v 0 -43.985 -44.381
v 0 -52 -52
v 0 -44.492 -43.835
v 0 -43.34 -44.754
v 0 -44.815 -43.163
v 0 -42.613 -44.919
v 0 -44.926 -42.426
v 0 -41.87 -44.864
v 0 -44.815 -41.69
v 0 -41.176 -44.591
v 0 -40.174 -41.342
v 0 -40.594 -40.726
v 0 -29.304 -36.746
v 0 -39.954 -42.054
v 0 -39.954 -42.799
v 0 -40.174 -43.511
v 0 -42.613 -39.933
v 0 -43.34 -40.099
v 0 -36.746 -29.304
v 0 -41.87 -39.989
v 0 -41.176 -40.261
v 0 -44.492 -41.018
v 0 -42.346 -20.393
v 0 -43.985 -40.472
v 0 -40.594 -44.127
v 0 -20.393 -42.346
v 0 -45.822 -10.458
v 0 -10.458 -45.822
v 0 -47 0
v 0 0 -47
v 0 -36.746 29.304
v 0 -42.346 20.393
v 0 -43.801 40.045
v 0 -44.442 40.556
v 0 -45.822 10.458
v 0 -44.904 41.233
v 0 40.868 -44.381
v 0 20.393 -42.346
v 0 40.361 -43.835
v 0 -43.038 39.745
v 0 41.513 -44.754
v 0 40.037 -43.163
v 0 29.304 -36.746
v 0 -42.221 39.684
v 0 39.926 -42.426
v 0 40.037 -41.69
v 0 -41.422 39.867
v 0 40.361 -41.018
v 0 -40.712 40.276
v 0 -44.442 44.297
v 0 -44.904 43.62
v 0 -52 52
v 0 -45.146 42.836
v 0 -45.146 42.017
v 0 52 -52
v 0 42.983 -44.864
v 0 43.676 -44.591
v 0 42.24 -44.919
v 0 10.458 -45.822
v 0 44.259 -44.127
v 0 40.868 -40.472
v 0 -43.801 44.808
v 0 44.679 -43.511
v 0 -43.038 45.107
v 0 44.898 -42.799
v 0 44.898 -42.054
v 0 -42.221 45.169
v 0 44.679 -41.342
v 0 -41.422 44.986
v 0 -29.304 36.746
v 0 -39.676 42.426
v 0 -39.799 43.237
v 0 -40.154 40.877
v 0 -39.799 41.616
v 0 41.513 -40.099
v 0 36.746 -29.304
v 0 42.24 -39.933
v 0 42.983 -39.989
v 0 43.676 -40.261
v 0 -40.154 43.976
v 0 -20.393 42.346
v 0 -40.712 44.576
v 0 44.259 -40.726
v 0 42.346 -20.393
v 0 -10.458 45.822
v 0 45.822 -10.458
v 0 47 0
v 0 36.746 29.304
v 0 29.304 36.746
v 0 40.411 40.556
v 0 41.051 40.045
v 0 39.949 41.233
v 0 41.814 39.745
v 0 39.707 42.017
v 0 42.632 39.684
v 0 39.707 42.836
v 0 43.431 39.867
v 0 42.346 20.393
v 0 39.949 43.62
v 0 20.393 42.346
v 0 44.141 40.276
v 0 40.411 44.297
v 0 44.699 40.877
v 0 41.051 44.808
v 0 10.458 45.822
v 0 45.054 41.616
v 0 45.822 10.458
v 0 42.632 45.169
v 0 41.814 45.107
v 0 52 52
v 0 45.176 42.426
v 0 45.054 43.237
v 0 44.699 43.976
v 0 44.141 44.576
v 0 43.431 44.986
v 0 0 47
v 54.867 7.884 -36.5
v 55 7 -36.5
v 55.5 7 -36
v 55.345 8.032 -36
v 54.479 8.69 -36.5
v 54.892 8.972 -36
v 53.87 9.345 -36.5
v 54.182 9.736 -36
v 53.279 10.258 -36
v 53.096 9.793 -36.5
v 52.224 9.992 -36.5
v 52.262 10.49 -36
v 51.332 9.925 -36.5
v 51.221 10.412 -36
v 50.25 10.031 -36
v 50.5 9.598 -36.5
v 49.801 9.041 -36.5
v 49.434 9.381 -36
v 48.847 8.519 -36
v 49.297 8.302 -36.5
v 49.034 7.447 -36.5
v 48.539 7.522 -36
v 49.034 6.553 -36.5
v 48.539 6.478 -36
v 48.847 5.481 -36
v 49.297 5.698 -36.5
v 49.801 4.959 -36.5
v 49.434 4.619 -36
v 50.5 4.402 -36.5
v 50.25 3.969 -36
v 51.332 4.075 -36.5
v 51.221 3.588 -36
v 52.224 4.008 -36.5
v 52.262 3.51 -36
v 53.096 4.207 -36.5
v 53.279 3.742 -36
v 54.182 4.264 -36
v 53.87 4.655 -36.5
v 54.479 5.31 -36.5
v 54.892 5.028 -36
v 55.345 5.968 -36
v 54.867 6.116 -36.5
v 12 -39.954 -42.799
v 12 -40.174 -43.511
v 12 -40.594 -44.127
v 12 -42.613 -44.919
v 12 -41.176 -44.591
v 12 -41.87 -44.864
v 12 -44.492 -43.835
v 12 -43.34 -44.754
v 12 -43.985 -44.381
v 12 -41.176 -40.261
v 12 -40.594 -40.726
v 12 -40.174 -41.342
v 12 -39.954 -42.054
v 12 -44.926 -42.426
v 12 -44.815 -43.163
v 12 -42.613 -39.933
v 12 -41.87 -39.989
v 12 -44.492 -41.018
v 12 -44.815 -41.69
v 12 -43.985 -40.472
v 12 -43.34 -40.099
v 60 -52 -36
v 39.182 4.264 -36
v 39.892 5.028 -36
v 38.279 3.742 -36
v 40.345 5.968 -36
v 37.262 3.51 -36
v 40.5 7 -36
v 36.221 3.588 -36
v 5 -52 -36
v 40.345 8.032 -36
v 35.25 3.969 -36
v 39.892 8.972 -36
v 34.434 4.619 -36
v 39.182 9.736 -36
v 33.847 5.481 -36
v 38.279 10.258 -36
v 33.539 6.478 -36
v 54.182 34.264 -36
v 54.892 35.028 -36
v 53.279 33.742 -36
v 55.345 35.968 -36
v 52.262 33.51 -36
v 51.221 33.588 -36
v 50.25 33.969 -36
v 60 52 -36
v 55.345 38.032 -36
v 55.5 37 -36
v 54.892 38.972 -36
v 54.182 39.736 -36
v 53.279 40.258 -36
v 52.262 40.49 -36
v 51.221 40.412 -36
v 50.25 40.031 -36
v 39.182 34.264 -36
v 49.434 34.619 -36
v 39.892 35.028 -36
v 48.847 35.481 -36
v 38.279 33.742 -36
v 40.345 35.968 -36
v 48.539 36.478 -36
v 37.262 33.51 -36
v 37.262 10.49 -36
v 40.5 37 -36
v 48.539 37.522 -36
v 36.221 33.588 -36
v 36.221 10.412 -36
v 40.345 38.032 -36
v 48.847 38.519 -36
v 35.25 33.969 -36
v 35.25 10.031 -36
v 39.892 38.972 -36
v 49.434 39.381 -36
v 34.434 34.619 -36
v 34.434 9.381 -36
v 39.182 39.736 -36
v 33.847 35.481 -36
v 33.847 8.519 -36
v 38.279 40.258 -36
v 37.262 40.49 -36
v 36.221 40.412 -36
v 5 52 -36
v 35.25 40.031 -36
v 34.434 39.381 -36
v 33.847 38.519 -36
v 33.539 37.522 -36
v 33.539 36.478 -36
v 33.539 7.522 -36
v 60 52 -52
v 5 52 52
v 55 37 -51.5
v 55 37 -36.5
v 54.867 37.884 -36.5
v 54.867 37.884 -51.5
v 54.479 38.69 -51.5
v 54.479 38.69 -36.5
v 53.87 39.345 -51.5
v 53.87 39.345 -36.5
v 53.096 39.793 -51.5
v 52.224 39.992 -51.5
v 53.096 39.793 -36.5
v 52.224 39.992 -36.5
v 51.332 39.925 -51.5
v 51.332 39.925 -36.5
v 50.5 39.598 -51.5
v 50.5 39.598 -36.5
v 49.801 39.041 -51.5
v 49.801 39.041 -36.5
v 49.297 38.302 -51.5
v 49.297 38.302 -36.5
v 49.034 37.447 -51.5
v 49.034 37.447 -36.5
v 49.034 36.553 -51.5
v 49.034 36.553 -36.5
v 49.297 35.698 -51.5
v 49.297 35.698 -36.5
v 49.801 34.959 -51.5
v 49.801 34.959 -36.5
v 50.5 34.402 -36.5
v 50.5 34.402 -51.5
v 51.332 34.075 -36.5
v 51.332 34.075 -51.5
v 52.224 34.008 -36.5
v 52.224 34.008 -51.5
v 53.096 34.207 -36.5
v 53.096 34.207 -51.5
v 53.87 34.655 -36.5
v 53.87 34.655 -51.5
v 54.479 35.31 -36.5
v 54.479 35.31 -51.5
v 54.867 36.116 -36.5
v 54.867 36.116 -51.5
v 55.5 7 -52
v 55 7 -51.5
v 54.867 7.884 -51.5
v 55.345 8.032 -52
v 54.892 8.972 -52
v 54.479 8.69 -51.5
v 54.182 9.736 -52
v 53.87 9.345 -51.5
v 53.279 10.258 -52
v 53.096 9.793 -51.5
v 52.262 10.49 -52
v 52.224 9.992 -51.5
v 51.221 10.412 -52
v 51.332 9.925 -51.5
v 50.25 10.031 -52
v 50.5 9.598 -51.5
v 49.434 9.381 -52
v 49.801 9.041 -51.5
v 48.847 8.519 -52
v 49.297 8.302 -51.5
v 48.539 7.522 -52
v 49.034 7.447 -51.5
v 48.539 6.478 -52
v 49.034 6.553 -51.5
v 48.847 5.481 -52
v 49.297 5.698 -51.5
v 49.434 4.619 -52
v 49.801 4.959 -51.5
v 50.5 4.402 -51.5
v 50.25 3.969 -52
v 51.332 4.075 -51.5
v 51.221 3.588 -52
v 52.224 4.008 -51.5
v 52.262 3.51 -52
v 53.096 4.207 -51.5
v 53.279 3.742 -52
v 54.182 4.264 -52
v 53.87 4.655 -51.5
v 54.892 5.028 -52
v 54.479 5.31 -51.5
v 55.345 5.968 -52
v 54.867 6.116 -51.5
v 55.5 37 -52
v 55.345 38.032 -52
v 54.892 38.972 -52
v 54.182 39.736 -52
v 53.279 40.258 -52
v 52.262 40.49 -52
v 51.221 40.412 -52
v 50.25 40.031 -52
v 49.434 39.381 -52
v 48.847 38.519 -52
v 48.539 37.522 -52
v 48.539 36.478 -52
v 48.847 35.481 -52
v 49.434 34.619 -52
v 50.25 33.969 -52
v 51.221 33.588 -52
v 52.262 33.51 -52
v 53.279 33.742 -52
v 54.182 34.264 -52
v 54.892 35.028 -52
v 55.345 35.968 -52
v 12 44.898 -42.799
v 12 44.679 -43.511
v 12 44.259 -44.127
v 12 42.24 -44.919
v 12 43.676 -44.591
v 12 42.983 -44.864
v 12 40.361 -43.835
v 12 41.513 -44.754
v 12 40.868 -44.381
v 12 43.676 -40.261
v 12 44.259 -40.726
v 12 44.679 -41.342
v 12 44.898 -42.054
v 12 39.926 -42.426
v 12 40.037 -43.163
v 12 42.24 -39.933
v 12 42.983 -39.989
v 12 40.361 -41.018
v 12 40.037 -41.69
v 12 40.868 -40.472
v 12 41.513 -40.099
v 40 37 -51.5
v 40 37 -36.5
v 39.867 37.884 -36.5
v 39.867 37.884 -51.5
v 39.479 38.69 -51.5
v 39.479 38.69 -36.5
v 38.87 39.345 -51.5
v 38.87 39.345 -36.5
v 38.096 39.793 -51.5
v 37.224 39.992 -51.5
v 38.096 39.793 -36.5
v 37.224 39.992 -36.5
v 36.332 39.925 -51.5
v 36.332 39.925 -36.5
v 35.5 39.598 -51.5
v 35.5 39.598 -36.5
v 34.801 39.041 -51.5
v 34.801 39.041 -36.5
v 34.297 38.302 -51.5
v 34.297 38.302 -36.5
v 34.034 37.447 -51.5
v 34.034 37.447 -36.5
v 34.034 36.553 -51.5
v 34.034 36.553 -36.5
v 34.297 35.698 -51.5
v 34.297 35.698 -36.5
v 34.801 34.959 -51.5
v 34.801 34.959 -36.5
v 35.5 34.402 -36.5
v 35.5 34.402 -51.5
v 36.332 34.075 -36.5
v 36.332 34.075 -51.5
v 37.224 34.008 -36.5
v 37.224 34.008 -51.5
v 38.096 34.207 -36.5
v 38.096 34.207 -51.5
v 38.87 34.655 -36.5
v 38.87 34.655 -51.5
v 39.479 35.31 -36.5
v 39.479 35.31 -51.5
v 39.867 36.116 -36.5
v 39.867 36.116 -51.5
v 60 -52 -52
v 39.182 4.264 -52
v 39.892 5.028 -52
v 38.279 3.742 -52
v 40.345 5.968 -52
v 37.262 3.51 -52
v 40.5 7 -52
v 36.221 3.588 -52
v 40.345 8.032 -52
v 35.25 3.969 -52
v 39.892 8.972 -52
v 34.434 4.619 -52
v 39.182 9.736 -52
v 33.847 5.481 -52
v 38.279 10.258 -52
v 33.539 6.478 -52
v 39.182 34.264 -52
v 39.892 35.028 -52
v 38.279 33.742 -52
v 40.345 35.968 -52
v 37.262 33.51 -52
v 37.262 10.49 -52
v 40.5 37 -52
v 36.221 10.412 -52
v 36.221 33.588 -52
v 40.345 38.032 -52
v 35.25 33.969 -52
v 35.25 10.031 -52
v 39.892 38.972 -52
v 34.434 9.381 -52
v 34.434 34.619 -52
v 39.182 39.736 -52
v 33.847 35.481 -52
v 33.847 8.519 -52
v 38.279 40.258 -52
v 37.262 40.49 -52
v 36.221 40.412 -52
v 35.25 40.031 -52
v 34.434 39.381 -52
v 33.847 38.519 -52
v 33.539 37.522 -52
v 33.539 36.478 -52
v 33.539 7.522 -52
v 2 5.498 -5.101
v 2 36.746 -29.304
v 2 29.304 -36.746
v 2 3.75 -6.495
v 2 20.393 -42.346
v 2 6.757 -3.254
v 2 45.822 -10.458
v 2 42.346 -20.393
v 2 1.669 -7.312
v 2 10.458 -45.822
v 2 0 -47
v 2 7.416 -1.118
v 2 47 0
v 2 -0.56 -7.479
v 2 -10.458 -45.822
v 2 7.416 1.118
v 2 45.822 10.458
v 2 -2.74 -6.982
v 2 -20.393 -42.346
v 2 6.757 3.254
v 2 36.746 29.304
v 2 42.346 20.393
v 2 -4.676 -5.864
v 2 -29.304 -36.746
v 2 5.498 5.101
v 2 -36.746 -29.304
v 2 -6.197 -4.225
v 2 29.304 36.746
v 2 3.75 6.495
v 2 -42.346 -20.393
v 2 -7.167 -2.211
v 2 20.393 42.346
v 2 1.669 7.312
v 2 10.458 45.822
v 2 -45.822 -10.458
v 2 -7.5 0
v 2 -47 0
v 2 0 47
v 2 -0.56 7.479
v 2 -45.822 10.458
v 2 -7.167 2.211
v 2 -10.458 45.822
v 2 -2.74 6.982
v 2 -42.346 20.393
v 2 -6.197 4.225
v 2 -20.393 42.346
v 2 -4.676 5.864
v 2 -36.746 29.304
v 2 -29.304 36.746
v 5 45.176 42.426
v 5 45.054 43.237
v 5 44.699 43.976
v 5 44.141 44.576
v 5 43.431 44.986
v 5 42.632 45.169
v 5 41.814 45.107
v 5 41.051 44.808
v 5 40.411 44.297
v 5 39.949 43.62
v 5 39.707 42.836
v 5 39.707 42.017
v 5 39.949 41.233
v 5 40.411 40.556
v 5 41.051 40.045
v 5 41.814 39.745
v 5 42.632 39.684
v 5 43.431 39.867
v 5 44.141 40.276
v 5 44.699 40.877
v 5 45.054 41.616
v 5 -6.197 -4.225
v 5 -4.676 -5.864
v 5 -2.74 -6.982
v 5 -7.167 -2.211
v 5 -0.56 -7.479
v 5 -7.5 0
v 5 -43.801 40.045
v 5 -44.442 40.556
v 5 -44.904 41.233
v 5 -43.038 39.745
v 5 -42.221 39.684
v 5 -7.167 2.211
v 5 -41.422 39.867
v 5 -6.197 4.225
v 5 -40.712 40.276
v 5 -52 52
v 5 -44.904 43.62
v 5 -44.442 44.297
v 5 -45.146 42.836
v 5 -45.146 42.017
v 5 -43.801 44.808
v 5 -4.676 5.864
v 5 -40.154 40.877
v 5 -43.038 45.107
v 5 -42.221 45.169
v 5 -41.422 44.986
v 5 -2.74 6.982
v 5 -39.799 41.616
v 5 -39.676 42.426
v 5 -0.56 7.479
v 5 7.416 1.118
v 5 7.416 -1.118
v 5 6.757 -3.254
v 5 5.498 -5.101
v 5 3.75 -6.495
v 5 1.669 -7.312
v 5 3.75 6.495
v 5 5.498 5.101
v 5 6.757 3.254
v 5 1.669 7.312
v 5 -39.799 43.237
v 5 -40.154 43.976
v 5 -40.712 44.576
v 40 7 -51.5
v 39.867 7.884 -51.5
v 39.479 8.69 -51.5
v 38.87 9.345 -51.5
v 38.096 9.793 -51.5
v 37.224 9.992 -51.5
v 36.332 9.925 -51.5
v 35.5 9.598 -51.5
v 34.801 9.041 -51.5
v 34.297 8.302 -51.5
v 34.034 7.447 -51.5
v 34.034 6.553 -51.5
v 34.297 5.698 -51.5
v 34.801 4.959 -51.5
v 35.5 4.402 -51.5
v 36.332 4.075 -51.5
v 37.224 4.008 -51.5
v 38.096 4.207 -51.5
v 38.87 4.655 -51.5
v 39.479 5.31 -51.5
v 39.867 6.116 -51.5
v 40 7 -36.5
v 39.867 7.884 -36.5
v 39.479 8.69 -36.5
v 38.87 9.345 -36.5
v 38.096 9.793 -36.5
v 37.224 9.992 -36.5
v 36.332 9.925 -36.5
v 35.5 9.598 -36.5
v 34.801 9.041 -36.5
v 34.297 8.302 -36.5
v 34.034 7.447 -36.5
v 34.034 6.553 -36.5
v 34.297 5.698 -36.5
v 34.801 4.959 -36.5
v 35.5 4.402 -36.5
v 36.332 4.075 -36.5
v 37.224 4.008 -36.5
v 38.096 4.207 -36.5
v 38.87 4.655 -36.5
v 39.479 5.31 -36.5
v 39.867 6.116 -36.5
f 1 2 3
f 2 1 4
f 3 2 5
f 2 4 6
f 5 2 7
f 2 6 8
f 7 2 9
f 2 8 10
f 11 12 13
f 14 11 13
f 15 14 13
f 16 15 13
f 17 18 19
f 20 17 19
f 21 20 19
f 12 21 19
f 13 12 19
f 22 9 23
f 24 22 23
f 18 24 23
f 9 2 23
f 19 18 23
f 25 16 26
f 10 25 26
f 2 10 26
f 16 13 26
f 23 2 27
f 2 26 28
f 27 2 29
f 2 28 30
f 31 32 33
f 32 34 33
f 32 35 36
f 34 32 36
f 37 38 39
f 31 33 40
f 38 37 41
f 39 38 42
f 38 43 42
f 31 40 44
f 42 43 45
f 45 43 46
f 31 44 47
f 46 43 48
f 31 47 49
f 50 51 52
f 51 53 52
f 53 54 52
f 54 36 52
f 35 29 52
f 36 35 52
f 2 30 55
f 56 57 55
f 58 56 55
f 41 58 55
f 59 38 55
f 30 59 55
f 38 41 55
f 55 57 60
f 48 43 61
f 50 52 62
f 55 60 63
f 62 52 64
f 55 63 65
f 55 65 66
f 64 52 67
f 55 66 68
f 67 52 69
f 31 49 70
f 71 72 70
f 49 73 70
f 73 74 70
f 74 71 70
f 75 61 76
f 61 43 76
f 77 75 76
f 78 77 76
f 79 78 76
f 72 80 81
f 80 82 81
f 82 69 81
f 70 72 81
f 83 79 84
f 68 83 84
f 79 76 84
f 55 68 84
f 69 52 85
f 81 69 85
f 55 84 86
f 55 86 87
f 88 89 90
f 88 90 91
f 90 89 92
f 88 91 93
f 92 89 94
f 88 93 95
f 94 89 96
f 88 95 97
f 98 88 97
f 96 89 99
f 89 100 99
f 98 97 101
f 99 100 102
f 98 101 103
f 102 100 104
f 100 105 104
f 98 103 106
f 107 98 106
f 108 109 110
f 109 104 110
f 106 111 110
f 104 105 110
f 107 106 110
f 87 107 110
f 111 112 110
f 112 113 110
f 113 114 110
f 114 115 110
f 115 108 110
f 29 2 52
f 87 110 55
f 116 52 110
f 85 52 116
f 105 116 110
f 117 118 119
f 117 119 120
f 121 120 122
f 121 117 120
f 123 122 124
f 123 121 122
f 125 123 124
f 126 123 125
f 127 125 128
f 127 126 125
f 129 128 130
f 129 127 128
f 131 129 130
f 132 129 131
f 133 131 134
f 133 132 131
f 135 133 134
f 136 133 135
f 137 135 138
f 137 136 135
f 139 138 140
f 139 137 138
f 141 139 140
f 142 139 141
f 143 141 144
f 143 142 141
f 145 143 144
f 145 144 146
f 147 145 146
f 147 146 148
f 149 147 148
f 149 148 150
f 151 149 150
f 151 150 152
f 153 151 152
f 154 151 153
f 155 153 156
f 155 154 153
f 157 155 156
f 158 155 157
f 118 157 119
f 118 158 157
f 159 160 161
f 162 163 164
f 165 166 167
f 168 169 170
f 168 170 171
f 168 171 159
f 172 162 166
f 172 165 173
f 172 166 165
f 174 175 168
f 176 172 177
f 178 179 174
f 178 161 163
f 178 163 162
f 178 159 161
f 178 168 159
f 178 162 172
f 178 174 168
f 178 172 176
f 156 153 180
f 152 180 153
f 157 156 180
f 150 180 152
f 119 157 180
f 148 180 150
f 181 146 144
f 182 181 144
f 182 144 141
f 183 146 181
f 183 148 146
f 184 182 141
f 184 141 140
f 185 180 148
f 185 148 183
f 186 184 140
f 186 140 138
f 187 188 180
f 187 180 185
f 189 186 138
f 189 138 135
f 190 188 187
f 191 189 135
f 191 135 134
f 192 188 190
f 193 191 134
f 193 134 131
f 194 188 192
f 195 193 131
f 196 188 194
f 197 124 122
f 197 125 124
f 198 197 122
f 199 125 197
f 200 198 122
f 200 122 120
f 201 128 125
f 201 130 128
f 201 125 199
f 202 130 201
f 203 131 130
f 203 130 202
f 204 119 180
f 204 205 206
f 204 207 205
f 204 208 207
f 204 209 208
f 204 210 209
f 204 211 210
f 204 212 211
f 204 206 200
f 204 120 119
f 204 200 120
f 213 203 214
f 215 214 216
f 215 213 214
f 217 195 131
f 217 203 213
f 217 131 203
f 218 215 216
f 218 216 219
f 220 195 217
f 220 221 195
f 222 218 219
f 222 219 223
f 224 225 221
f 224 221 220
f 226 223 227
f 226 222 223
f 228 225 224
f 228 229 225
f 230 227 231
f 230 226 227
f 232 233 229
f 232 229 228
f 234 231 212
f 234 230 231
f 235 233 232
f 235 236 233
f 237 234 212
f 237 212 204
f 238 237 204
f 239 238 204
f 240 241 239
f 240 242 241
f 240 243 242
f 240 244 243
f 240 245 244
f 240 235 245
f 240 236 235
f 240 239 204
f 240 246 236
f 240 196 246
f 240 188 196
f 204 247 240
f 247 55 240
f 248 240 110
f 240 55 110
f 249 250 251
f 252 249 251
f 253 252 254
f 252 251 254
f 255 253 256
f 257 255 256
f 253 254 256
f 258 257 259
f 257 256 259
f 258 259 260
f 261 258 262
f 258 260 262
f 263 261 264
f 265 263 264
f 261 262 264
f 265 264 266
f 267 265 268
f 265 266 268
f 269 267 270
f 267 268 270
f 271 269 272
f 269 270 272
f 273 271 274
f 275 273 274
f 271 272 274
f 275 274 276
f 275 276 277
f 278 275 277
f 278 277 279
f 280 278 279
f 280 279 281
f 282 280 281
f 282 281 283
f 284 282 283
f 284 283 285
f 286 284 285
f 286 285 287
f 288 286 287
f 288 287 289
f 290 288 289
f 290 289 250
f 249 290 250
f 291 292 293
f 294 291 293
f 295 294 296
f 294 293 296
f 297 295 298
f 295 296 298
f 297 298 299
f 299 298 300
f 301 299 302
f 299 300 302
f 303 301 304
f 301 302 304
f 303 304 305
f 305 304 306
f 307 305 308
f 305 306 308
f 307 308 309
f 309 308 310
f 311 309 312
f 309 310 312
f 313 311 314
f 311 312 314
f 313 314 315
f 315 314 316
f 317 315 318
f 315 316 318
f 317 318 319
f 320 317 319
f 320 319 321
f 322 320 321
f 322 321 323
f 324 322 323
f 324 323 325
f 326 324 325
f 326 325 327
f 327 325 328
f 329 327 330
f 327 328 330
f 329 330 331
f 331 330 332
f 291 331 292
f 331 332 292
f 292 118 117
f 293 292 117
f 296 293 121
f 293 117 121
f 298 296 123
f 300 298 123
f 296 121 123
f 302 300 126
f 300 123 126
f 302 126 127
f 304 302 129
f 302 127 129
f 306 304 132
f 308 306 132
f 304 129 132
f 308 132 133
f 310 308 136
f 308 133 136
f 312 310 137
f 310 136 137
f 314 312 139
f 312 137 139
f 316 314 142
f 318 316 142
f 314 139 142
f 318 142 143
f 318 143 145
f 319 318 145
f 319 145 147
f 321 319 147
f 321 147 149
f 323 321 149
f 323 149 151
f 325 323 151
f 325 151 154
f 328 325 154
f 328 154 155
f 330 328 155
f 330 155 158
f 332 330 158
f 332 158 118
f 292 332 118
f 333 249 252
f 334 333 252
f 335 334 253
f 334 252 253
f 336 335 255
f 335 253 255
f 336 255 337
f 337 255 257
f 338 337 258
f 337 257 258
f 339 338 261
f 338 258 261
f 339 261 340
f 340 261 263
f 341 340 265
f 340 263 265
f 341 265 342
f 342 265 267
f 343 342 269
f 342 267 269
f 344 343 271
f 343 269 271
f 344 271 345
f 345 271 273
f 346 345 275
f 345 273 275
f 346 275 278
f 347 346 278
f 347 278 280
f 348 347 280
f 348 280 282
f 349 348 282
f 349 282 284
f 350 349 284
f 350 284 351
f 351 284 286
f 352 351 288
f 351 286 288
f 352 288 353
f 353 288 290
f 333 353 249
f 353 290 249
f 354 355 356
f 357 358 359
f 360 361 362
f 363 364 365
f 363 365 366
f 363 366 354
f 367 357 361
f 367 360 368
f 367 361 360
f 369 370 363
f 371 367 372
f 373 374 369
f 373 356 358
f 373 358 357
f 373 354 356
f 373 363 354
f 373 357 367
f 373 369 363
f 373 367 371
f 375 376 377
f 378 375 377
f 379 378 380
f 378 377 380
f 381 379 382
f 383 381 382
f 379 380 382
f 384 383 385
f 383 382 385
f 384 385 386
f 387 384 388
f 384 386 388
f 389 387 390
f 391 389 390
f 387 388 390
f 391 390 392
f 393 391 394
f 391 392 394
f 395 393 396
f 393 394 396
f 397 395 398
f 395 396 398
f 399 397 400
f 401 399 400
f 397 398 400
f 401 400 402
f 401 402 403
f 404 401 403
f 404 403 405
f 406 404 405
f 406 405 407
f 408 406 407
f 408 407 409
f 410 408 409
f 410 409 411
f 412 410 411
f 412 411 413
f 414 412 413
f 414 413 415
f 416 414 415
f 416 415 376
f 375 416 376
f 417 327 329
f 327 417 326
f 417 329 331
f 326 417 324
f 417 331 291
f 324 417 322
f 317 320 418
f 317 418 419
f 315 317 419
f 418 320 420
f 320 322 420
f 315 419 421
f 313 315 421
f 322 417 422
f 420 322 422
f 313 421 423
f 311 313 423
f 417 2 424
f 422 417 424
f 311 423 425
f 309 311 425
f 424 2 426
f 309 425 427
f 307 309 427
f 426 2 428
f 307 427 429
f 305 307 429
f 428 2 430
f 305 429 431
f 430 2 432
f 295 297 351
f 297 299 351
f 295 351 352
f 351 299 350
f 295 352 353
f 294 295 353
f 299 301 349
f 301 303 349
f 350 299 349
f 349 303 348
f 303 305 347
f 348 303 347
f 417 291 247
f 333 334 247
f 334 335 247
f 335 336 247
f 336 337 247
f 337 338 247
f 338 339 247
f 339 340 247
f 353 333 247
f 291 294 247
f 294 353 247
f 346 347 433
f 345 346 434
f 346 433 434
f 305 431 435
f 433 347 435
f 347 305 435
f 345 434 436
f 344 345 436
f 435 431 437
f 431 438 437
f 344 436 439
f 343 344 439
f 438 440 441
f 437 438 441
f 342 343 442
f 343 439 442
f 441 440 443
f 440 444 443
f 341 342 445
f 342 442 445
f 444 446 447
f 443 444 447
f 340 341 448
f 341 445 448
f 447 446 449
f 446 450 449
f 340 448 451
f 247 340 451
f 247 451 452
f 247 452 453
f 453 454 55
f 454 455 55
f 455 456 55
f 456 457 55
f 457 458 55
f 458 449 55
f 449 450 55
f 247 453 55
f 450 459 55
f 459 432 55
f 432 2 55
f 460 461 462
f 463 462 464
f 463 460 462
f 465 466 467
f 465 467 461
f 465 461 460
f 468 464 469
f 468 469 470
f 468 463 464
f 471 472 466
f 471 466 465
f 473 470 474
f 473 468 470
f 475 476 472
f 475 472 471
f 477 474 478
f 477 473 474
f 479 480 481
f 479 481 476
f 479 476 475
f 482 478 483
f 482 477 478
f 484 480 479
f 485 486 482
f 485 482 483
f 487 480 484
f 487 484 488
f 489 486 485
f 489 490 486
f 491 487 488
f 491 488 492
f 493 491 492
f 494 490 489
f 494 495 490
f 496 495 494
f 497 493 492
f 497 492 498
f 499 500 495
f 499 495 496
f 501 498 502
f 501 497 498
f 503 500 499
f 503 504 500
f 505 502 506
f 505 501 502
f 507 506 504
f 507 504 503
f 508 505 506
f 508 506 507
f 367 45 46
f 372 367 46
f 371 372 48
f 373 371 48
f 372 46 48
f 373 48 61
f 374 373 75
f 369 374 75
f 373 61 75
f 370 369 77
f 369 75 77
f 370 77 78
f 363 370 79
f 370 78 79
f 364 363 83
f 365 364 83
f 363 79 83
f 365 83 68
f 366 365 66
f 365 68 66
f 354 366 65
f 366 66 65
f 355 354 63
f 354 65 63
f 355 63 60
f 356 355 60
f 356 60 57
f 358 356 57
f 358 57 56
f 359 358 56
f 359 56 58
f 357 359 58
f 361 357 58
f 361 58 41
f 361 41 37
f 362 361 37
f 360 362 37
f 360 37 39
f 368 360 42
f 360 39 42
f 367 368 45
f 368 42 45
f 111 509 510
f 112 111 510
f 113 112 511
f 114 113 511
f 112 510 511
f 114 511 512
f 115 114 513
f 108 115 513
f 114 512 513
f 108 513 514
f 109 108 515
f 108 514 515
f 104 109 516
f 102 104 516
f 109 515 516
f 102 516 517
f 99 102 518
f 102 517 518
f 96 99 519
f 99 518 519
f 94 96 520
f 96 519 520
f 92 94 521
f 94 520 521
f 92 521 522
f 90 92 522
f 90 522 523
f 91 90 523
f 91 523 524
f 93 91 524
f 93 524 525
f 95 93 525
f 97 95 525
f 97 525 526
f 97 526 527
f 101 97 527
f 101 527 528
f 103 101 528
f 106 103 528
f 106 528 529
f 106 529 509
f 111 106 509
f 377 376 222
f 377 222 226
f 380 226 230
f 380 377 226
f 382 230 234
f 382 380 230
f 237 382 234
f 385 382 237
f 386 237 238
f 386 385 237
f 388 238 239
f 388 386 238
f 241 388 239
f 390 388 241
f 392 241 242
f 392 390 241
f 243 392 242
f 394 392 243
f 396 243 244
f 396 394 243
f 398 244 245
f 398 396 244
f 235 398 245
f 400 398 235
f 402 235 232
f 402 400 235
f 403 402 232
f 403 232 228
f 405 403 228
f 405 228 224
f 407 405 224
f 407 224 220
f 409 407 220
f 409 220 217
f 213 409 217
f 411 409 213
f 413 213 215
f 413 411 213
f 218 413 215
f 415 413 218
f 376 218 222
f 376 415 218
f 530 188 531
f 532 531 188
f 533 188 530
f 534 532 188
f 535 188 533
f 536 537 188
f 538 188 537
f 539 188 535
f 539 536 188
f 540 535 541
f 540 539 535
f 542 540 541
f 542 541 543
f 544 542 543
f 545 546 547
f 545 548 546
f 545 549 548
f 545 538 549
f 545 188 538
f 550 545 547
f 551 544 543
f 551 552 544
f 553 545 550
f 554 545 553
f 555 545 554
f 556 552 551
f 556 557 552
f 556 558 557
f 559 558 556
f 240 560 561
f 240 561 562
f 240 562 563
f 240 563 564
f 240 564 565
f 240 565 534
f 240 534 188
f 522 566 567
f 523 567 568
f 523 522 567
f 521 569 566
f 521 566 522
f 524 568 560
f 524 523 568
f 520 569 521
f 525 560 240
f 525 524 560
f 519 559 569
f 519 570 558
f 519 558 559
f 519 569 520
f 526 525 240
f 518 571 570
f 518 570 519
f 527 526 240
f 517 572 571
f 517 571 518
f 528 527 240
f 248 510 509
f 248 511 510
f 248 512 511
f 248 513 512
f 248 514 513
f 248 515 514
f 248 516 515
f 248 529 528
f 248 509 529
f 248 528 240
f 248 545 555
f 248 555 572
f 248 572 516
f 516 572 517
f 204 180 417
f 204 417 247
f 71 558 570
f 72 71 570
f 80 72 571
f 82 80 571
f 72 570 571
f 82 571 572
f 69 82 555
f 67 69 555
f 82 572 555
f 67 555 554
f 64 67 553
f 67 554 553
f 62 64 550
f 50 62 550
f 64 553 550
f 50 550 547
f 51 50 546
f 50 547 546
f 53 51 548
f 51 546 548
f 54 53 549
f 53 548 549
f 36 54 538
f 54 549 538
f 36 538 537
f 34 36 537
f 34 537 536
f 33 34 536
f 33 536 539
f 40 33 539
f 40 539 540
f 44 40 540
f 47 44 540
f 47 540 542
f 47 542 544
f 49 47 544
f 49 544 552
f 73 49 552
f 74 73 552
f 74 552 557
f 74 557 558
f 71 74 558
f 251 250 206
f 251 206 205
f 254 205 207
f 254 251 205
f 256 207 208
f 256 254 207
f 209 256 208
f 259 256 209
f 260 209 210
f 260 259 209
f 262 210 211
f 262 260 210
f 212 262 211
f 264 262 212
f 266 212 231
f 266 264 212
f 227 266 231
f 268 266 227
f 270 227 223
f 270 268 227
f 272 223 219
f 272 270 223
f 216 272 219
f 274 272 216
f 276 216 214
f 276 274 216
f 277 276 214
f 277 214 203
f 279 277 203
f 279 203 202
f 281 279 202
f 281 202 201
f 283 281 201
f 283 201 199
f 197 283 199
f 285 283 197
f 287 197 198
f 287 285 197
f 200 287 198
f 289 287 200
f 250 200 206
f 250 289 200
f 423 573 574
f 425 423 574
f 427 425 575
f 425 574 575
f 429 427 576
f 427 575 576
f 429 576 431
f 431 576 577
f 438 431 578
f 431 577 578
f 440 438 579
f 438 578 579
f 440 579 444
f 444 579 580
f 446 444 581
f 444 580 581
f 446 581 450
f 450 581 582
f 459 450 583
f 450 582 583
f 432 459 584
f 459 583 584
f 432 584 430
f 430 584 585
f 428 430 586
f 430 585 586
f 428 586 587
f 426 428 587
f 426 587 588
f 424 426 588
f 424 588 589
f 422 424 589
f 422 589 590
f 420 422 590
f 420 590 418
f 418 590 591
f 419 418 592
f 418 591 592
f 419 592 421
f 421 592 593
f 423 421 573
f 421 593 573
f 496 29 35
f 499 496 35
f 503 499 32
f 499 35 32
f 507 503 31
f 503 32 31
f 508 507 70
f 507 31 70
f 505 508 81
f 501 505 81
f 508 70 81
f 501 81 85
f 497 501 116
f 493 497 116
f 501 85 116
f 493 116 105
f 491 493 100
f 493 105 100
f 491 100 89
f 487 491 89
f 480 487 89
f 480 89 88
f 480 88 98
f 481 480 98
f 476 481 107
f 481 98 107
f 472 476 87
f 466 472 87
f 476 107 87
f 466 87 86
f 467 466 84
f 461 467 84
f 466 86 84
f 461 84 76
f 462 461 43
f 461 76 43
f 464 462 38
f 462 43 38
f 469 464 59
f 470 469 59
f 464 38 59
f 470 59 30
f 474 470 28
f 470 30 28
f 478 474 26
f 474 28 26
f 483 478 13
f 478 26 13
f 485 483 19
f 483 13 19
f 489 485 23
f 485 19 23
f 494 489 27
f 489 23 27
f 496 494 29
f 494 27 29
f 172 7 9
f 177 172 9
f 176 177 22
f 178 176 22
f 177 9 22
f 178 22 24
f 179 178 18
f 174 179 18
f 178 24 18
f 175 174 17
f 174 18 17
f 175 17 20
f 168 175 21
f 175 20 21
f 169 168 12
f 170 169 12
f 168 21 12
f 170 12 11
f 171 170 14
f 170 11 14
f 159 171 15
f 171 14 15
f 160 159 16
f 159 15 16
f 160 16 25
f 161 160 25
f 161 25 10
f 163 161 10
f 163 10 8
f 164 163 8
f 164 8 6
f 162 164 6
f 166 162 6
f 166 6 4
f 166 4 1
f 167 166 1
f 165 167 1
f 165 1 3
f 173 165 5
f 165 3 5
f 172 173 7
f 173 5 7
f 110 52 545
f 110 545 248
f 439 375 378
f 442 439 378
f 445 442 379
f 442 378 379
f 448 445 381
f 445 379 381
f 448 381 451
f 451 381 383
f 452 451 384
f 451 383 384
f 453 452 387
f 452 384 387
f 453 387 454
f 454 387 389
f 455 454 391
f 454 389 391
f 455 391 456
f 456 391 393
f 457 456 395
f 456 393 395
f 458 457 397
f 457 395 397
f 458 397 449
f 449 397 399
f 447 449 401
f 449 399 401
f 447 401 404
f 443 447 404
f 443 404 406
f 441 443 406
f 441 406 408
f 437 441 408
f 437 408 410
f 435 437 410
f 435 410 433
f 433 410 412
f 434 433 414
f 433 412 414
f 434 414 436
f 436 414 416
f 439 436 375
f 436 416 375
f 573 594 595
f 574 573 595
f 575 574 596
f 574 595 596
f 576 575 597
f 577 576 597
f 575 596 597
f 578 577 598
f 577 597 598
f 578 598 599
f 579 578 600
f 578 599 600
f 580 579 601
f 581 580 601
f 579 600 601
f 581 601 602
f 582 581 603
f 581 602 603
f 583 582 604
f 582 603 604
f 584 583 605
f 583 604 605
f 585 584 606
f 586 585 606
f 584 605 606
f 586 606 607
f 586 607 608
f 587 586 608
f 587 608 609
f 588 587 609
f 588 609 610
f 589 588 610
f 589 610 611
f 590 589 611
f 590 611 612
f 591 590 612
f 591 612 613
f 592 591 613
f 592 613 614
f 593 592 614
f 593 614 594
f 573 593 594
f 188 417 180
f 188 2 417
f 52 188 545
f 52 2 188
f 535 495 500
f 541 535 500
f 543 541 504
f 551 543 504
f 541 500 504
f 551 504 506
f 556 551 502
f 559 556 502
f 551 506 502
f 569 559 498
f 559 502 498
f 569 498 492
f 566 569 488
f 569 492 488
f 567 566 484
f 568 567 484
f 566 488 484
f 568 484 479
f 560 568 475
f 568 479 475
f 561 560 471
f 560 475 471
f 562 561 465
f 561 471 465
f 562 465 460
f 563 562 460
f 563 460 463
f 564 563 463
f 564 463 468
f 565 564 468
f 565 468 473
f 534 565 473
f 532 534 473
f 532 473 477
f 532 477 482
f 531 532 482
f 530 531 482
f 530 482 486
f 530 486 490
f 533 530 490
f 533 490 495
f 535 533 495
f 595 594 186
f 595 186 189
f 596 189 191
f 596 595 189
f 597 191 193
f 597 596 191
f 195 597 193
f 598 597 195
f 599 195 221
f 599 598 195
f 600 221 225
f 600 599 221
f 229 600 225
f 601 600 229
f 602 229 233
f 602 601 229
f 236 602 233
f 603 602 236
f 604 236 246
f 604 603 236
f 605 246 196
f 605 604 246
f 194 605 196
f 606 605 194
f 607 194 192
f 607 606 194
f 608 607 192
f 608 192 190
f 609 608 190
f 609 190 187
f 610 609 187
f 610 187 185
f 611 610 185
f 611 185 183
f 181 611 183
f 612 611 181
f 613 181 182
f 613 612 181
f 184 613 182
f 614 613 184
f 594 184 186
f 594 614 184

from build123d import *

# Parameters (mm, degrees)
F0_W      = 104
F0_H      = 104
F1_DEPTH  = 5
F2_R      = 2.75
F3_DEPTH  = 5.001
F4_W      = 104
F4_H      = 16
F5_DEPTH  = 55
F6_R      = 2.5
F7_DEPTH  = 12
F9_R      = 47
F10_DEPTH = 2
F11_R     = 7.5
F12_DEPTH = 58.001
F8_R      = 3
F13_DEPTH = 16.001
F14_SIZE  = 0.5


with BuildPart() as f1:
    # F0 (on Right) → F1 (new body)
    with BuildSketch(Plane.YZ):
        Rectangle(F0_W, F0_H)
    extrude(amount=F1_DEPTH)

    # F2 (on face) → F3 (cut, through all)
    with BuildSketch(Plane.YZ.offset(5)):
        with Locations((42.426407, 42.426407)):
            Circle(F2_R)
        with Locations((-42.426407, 42.426407)):
            Circle(F2_R)
    extrude(amount=-F3_DEPTH, mode=Mode.SUBTRACT)

    # F4 (on face) → F5 (join)
    with BuildSketch(Plane.YZ.offset(5)):
        with Locations((0, -44)):
            Rectangle(F4_W, F4_H)
    extrude(amount=F5_DEPTH)

    # F6 (on face) → F7 (cut)
    with BuildSketch(Plane(origin=(0, 0, 0), x_dir=(0, -1, 0), z_dir=(-1, 0, 0))):
        with Locations((-42.426407, -42.426407)):
            Circle(F6_R)
        with Locations((42.426407, -42.426407)):
            Circle(F6_R)
    extrude(amount=-F7_DEPTH, mode=Mode.SUBTRACT)

    # F9 (on face) → F10 (cut)
    with BuildSketch(Plane(origin=(0, 0, 0), x_dir=(0, -1, 0), z_dir=(-1, 0, 0))):
        Circle(F9_R)
    extrude(amount=-F10_DEPTH, mode=Mode.SUBTRACT)

    # F11 (on face) → F12 (cut, through all)
    with BuildSketch(Plane(origin=(2, 0, 0), x_dir=(0, -1, 0), z_dir=(-1, 0, 0))):
        Circle(F11_R)
    extrude(amount=-F12_DEPTH, mode=Mode.SUBTRACT)

    # F8 (on face) → F13 (cut, through all)
    with BuildSketch(Plane.XY.offset(-36)):
        with Locations((52, 37)):
            Circle(F8_R)
        with Locations((52, 7)):
            Circle(F8_R)
        with Locations((37, 37)):
            Circle(F8_R)
        with Locations((37, 7)):
            Circle(F8_R)
    extrude(amount=-F13_DEPTH, mode=Mode.SUBTRACT)

    # F14
    f14_edges = [f1.edges().sort_by_distance(p)[0] for p in [
        (34, 37, -36),
        (40, 37, -44),
        (34, 37, -52),
        (49, 37, -36),
        (55, 37, -44),
        (49, 37, -52),
        (34, 7, -36),
        (40, 7, -44),
        (34, 7, -52),
        (49, 7, -36),
        (55, 7, -44),
        (49, 7, -52),
    ]]
    chamfer(f14_edges, length=F14_SIZE)


solid = f1.part
